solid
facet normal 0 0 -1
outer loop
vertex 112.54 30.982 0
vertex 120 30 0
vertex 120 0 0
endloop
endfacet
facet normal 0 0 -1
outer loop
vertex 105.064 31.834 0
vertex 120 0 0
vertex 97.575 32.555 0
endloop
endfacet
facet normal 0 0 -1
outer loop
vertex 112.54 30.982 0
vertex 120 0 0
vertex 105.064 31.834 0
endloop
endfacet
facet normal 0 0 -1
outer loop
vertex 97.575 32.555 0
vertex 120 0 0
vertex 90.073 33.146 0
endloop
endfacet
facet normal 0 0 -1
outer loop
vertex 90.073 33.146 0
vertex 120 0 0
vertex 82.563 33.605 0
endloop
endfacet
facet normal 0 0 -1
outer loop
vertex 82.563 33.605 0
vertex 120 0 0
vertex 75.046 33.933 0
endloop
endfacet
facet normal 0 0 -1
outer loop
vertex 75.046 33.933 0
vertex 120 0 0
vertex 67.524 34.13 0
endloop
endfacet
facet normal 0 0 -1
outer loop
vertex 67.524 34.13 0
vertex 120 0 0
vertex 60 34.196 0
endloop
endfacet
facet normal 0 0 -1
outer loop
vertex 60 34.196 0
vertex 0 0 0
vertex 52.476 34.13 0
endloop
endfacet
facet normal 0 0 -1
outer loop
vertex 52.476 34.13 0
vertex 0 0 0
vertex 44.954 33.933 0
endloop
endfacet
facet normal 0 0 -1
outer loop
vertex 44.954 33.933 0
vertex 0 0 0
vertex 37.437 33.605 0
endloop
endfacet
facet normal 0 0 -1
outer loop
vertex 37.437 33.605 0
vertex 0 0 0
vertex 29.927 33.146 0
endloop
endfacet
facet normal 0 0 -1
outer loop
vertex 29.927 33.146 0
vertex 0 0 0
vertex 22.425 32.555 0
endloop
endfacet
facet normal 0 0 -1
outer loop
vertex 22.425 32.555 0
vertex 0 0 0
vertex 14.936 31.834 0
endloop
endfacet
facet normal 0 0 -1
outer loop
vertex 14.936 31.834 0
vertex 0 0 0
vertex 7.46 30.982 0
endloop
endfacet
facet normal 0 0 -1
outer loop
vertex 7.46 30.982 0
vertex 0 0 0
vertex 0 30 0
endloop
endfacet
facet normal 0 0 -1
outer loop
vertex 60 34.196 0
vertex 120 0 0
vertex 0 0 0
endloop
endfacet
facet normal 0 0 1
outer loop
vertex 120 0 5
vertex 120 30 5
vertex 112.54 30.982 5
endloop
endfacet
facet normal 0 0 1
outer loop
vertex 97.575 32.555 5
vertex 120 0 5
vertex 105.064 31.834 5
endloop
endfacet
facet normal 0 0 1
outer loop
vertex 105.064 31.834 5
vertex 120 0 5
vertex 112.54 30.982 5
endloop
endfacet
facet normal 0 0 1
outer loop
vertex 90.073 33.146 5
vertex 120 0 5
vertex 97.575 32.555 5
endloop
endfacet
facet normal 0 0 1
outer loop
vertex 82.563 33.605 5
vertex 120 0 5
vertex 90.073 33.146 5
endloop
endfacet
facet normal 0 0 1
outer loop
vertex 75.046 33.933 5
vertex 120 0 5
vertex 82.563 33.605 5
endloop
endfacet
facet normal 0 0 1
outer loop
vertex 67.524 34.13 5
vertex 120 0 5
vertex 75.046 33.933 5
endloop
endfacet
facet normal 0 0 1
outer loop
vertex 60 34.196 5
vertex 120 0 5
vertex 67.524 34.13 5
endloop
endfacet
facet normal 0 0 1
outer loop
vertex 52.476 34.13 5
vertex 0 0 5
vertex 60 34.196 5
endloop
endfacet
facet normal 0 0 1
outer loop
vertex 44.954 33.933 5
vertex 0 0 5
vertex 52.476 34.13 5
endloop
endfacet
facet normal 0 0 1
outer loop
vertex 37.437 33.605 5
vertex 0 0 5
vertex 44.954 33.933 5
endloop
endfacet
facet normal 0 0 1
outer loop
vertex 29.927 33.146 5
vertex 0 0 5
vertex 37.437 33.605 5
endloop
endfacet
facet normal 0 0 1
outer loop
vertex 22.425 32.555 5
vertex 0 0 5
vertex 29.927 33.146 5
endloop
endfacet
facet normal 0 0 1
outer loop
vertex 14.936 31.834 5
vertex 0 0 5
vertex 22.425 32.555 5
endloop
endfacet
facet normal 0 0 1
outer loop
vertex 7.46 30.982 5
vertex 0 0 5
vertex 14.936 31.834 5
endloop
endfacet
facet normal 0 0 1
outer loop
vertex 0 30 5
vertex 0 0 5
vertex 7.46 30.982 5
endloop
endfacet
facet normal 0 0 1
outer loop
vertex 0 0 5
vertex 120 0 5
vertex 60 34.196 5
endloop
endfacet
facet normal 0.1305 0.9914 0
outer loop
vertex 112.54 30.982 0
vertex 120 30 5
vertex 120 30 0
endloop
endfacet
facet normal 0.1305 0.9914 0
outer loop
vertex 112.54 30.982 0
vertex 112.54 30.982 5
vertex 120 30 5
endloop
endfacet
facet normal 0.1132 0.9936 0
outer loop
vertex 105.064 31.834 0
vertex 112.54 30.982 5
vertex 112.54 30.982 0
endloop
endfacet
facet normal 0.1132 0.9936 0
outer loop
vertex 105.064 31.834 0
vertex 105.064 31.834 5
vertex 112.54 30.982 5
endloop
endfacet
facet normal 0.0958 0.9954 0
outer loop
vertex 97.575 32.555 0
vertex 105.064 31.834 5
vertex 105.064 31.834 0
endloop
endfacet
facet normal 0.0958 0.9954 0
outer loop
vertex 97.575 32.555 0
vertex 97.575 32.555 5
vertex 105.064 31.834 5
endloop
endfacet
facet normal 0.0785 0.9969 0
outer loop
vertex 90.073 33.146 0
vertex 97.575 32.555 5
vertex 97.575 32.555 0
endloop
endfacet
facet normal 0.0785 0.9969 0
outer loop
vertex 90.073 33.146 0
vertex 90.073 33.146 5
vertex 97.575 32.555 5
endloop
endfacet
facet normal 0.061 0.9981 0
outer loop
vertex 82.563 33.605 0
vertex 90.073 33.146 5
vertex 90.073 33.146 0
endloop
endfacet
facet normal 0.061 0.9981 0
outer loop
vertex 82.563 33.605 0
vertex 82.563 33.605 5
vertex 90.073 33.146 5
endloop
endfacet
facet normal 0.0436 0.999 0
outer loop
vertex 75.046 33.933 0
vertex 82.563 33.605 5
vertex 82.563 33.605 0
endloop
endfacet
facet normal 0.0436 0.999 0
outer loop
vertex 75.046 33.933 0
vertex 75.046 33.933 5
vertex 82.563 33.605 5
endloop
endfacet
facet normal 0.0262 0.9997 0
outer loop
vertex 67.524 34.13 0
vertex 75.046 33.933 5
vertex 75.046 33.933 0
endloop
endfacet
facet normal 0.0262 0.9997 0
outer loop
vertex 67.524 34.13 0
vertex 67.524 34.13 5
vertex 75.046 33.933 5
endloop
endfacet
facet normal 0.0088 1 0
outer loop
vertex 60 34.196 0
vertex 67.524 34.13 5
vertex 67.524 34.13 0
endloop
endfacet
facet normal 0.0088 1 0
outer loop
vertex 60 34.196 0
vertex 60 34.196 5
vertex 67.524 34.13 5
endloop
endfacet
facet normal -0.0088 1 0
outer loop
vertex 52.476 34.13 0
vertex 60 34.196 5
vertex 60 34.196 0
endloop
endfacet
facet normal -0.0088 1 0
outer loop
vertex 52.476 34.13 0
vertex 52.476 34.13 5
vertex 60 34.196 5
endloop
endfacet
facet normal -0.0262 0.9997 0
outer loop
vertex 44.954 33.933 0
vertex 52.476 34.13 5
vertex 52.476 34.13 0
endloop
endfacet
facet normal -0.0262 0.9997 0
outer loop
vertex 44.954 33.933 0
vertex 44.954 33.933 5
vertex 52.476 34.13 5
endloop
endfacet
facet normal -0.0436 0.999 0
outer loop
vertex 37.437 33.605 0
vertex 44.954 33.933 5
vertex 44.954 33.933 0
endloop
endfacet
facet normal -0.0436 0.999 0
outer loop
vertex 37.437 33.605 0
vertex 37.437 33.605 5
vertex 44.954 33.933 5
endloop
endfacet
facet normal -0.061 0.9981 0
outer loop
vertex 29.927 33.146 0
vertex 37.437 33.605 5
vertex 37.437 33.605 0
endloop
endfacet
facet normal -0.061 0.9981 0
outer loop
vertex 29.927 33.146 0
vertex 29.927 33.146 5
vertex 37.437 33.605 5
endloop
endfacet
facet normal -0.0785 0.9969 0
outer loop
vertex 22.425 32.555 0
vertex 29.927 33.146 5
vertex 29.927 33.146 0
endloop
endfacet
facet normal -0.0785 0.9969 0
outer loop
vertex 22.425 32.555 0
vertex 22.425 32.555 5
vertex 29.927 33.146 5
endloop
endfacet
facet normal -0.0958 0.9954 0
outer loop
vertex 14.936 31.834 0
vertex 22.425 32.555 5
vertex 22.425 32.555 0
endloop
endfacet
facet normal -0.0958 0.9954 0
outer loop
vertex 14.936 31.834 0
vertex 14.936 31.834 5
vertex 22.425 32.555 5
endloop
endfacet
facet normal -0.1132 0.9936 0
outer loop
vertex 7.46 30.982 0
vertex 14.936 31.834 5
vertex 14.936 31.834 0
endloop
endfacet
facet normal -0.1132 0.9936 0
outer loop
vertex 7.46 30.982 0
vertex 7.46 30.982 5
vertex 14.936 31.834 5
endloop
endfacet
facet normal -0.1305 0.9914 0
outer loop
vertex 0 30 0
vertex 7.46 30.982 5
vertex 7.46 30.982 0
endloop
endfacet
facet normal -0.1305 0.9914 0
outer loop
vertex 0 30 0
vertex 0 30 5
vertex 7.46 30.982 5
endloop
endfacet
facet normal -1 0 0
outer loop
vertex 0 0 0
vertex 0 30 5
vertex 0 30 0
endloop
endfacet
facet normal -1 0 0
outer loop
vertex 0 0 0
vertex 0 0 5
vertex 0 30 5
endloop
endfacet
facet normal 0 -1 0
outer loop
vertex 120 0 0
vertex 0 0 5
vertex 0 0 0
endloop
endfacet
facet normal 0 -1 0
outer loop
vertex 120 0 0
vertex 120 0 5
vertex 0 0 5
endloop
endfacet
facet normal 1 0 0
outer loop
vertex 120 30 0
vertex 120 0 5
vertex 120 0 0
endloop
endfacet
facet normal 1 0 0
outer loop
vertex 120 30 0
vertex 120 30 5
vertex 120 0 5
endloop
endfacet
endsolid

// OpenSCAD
$fn = 32;

// ----------------------------------------------------------------------
// Arc profile plate: crown, 19 points
// ----------------------------------------------------------------------

// --- parameters (mm) ---
bar_l = 120;              // bar length, X
bar_w = 30;               // bar height at the ends, Y
arc_r = 431.12;           // radius of the crown arc
arc_angle = 16;           // crown arc angle, degrees
crown_rise = 4.2;         // rise of the crown over the ends
arc_step = 1;             // sampling step of the crown arc, degrees
plate_t = 5;              // plate thickness, Z

bbox_y = bar_w + crown_rise;  // full height with the crown

profile = [[120, 30], [112.54, 30.982], [105.064, 31.834], [97.575, 32.555], [90.073, 33.146], [82.563, 33.605], [75.046, 33.933], [67.524, 34.13], [60, 34.196], [52.476, 34.13], [44.954, 33.933], [37.437, 33.605], [29.927, 33.146], [22.425, 32.555], [14.936, 31.834], [7.46, 30.982], [0, 30], [0, 0], [120, 0]];  // primary outline, 19 points, counter clockwise

// --- the one profile operation ---
linear_extrude(height = plate_t) polygon(points = profile);
